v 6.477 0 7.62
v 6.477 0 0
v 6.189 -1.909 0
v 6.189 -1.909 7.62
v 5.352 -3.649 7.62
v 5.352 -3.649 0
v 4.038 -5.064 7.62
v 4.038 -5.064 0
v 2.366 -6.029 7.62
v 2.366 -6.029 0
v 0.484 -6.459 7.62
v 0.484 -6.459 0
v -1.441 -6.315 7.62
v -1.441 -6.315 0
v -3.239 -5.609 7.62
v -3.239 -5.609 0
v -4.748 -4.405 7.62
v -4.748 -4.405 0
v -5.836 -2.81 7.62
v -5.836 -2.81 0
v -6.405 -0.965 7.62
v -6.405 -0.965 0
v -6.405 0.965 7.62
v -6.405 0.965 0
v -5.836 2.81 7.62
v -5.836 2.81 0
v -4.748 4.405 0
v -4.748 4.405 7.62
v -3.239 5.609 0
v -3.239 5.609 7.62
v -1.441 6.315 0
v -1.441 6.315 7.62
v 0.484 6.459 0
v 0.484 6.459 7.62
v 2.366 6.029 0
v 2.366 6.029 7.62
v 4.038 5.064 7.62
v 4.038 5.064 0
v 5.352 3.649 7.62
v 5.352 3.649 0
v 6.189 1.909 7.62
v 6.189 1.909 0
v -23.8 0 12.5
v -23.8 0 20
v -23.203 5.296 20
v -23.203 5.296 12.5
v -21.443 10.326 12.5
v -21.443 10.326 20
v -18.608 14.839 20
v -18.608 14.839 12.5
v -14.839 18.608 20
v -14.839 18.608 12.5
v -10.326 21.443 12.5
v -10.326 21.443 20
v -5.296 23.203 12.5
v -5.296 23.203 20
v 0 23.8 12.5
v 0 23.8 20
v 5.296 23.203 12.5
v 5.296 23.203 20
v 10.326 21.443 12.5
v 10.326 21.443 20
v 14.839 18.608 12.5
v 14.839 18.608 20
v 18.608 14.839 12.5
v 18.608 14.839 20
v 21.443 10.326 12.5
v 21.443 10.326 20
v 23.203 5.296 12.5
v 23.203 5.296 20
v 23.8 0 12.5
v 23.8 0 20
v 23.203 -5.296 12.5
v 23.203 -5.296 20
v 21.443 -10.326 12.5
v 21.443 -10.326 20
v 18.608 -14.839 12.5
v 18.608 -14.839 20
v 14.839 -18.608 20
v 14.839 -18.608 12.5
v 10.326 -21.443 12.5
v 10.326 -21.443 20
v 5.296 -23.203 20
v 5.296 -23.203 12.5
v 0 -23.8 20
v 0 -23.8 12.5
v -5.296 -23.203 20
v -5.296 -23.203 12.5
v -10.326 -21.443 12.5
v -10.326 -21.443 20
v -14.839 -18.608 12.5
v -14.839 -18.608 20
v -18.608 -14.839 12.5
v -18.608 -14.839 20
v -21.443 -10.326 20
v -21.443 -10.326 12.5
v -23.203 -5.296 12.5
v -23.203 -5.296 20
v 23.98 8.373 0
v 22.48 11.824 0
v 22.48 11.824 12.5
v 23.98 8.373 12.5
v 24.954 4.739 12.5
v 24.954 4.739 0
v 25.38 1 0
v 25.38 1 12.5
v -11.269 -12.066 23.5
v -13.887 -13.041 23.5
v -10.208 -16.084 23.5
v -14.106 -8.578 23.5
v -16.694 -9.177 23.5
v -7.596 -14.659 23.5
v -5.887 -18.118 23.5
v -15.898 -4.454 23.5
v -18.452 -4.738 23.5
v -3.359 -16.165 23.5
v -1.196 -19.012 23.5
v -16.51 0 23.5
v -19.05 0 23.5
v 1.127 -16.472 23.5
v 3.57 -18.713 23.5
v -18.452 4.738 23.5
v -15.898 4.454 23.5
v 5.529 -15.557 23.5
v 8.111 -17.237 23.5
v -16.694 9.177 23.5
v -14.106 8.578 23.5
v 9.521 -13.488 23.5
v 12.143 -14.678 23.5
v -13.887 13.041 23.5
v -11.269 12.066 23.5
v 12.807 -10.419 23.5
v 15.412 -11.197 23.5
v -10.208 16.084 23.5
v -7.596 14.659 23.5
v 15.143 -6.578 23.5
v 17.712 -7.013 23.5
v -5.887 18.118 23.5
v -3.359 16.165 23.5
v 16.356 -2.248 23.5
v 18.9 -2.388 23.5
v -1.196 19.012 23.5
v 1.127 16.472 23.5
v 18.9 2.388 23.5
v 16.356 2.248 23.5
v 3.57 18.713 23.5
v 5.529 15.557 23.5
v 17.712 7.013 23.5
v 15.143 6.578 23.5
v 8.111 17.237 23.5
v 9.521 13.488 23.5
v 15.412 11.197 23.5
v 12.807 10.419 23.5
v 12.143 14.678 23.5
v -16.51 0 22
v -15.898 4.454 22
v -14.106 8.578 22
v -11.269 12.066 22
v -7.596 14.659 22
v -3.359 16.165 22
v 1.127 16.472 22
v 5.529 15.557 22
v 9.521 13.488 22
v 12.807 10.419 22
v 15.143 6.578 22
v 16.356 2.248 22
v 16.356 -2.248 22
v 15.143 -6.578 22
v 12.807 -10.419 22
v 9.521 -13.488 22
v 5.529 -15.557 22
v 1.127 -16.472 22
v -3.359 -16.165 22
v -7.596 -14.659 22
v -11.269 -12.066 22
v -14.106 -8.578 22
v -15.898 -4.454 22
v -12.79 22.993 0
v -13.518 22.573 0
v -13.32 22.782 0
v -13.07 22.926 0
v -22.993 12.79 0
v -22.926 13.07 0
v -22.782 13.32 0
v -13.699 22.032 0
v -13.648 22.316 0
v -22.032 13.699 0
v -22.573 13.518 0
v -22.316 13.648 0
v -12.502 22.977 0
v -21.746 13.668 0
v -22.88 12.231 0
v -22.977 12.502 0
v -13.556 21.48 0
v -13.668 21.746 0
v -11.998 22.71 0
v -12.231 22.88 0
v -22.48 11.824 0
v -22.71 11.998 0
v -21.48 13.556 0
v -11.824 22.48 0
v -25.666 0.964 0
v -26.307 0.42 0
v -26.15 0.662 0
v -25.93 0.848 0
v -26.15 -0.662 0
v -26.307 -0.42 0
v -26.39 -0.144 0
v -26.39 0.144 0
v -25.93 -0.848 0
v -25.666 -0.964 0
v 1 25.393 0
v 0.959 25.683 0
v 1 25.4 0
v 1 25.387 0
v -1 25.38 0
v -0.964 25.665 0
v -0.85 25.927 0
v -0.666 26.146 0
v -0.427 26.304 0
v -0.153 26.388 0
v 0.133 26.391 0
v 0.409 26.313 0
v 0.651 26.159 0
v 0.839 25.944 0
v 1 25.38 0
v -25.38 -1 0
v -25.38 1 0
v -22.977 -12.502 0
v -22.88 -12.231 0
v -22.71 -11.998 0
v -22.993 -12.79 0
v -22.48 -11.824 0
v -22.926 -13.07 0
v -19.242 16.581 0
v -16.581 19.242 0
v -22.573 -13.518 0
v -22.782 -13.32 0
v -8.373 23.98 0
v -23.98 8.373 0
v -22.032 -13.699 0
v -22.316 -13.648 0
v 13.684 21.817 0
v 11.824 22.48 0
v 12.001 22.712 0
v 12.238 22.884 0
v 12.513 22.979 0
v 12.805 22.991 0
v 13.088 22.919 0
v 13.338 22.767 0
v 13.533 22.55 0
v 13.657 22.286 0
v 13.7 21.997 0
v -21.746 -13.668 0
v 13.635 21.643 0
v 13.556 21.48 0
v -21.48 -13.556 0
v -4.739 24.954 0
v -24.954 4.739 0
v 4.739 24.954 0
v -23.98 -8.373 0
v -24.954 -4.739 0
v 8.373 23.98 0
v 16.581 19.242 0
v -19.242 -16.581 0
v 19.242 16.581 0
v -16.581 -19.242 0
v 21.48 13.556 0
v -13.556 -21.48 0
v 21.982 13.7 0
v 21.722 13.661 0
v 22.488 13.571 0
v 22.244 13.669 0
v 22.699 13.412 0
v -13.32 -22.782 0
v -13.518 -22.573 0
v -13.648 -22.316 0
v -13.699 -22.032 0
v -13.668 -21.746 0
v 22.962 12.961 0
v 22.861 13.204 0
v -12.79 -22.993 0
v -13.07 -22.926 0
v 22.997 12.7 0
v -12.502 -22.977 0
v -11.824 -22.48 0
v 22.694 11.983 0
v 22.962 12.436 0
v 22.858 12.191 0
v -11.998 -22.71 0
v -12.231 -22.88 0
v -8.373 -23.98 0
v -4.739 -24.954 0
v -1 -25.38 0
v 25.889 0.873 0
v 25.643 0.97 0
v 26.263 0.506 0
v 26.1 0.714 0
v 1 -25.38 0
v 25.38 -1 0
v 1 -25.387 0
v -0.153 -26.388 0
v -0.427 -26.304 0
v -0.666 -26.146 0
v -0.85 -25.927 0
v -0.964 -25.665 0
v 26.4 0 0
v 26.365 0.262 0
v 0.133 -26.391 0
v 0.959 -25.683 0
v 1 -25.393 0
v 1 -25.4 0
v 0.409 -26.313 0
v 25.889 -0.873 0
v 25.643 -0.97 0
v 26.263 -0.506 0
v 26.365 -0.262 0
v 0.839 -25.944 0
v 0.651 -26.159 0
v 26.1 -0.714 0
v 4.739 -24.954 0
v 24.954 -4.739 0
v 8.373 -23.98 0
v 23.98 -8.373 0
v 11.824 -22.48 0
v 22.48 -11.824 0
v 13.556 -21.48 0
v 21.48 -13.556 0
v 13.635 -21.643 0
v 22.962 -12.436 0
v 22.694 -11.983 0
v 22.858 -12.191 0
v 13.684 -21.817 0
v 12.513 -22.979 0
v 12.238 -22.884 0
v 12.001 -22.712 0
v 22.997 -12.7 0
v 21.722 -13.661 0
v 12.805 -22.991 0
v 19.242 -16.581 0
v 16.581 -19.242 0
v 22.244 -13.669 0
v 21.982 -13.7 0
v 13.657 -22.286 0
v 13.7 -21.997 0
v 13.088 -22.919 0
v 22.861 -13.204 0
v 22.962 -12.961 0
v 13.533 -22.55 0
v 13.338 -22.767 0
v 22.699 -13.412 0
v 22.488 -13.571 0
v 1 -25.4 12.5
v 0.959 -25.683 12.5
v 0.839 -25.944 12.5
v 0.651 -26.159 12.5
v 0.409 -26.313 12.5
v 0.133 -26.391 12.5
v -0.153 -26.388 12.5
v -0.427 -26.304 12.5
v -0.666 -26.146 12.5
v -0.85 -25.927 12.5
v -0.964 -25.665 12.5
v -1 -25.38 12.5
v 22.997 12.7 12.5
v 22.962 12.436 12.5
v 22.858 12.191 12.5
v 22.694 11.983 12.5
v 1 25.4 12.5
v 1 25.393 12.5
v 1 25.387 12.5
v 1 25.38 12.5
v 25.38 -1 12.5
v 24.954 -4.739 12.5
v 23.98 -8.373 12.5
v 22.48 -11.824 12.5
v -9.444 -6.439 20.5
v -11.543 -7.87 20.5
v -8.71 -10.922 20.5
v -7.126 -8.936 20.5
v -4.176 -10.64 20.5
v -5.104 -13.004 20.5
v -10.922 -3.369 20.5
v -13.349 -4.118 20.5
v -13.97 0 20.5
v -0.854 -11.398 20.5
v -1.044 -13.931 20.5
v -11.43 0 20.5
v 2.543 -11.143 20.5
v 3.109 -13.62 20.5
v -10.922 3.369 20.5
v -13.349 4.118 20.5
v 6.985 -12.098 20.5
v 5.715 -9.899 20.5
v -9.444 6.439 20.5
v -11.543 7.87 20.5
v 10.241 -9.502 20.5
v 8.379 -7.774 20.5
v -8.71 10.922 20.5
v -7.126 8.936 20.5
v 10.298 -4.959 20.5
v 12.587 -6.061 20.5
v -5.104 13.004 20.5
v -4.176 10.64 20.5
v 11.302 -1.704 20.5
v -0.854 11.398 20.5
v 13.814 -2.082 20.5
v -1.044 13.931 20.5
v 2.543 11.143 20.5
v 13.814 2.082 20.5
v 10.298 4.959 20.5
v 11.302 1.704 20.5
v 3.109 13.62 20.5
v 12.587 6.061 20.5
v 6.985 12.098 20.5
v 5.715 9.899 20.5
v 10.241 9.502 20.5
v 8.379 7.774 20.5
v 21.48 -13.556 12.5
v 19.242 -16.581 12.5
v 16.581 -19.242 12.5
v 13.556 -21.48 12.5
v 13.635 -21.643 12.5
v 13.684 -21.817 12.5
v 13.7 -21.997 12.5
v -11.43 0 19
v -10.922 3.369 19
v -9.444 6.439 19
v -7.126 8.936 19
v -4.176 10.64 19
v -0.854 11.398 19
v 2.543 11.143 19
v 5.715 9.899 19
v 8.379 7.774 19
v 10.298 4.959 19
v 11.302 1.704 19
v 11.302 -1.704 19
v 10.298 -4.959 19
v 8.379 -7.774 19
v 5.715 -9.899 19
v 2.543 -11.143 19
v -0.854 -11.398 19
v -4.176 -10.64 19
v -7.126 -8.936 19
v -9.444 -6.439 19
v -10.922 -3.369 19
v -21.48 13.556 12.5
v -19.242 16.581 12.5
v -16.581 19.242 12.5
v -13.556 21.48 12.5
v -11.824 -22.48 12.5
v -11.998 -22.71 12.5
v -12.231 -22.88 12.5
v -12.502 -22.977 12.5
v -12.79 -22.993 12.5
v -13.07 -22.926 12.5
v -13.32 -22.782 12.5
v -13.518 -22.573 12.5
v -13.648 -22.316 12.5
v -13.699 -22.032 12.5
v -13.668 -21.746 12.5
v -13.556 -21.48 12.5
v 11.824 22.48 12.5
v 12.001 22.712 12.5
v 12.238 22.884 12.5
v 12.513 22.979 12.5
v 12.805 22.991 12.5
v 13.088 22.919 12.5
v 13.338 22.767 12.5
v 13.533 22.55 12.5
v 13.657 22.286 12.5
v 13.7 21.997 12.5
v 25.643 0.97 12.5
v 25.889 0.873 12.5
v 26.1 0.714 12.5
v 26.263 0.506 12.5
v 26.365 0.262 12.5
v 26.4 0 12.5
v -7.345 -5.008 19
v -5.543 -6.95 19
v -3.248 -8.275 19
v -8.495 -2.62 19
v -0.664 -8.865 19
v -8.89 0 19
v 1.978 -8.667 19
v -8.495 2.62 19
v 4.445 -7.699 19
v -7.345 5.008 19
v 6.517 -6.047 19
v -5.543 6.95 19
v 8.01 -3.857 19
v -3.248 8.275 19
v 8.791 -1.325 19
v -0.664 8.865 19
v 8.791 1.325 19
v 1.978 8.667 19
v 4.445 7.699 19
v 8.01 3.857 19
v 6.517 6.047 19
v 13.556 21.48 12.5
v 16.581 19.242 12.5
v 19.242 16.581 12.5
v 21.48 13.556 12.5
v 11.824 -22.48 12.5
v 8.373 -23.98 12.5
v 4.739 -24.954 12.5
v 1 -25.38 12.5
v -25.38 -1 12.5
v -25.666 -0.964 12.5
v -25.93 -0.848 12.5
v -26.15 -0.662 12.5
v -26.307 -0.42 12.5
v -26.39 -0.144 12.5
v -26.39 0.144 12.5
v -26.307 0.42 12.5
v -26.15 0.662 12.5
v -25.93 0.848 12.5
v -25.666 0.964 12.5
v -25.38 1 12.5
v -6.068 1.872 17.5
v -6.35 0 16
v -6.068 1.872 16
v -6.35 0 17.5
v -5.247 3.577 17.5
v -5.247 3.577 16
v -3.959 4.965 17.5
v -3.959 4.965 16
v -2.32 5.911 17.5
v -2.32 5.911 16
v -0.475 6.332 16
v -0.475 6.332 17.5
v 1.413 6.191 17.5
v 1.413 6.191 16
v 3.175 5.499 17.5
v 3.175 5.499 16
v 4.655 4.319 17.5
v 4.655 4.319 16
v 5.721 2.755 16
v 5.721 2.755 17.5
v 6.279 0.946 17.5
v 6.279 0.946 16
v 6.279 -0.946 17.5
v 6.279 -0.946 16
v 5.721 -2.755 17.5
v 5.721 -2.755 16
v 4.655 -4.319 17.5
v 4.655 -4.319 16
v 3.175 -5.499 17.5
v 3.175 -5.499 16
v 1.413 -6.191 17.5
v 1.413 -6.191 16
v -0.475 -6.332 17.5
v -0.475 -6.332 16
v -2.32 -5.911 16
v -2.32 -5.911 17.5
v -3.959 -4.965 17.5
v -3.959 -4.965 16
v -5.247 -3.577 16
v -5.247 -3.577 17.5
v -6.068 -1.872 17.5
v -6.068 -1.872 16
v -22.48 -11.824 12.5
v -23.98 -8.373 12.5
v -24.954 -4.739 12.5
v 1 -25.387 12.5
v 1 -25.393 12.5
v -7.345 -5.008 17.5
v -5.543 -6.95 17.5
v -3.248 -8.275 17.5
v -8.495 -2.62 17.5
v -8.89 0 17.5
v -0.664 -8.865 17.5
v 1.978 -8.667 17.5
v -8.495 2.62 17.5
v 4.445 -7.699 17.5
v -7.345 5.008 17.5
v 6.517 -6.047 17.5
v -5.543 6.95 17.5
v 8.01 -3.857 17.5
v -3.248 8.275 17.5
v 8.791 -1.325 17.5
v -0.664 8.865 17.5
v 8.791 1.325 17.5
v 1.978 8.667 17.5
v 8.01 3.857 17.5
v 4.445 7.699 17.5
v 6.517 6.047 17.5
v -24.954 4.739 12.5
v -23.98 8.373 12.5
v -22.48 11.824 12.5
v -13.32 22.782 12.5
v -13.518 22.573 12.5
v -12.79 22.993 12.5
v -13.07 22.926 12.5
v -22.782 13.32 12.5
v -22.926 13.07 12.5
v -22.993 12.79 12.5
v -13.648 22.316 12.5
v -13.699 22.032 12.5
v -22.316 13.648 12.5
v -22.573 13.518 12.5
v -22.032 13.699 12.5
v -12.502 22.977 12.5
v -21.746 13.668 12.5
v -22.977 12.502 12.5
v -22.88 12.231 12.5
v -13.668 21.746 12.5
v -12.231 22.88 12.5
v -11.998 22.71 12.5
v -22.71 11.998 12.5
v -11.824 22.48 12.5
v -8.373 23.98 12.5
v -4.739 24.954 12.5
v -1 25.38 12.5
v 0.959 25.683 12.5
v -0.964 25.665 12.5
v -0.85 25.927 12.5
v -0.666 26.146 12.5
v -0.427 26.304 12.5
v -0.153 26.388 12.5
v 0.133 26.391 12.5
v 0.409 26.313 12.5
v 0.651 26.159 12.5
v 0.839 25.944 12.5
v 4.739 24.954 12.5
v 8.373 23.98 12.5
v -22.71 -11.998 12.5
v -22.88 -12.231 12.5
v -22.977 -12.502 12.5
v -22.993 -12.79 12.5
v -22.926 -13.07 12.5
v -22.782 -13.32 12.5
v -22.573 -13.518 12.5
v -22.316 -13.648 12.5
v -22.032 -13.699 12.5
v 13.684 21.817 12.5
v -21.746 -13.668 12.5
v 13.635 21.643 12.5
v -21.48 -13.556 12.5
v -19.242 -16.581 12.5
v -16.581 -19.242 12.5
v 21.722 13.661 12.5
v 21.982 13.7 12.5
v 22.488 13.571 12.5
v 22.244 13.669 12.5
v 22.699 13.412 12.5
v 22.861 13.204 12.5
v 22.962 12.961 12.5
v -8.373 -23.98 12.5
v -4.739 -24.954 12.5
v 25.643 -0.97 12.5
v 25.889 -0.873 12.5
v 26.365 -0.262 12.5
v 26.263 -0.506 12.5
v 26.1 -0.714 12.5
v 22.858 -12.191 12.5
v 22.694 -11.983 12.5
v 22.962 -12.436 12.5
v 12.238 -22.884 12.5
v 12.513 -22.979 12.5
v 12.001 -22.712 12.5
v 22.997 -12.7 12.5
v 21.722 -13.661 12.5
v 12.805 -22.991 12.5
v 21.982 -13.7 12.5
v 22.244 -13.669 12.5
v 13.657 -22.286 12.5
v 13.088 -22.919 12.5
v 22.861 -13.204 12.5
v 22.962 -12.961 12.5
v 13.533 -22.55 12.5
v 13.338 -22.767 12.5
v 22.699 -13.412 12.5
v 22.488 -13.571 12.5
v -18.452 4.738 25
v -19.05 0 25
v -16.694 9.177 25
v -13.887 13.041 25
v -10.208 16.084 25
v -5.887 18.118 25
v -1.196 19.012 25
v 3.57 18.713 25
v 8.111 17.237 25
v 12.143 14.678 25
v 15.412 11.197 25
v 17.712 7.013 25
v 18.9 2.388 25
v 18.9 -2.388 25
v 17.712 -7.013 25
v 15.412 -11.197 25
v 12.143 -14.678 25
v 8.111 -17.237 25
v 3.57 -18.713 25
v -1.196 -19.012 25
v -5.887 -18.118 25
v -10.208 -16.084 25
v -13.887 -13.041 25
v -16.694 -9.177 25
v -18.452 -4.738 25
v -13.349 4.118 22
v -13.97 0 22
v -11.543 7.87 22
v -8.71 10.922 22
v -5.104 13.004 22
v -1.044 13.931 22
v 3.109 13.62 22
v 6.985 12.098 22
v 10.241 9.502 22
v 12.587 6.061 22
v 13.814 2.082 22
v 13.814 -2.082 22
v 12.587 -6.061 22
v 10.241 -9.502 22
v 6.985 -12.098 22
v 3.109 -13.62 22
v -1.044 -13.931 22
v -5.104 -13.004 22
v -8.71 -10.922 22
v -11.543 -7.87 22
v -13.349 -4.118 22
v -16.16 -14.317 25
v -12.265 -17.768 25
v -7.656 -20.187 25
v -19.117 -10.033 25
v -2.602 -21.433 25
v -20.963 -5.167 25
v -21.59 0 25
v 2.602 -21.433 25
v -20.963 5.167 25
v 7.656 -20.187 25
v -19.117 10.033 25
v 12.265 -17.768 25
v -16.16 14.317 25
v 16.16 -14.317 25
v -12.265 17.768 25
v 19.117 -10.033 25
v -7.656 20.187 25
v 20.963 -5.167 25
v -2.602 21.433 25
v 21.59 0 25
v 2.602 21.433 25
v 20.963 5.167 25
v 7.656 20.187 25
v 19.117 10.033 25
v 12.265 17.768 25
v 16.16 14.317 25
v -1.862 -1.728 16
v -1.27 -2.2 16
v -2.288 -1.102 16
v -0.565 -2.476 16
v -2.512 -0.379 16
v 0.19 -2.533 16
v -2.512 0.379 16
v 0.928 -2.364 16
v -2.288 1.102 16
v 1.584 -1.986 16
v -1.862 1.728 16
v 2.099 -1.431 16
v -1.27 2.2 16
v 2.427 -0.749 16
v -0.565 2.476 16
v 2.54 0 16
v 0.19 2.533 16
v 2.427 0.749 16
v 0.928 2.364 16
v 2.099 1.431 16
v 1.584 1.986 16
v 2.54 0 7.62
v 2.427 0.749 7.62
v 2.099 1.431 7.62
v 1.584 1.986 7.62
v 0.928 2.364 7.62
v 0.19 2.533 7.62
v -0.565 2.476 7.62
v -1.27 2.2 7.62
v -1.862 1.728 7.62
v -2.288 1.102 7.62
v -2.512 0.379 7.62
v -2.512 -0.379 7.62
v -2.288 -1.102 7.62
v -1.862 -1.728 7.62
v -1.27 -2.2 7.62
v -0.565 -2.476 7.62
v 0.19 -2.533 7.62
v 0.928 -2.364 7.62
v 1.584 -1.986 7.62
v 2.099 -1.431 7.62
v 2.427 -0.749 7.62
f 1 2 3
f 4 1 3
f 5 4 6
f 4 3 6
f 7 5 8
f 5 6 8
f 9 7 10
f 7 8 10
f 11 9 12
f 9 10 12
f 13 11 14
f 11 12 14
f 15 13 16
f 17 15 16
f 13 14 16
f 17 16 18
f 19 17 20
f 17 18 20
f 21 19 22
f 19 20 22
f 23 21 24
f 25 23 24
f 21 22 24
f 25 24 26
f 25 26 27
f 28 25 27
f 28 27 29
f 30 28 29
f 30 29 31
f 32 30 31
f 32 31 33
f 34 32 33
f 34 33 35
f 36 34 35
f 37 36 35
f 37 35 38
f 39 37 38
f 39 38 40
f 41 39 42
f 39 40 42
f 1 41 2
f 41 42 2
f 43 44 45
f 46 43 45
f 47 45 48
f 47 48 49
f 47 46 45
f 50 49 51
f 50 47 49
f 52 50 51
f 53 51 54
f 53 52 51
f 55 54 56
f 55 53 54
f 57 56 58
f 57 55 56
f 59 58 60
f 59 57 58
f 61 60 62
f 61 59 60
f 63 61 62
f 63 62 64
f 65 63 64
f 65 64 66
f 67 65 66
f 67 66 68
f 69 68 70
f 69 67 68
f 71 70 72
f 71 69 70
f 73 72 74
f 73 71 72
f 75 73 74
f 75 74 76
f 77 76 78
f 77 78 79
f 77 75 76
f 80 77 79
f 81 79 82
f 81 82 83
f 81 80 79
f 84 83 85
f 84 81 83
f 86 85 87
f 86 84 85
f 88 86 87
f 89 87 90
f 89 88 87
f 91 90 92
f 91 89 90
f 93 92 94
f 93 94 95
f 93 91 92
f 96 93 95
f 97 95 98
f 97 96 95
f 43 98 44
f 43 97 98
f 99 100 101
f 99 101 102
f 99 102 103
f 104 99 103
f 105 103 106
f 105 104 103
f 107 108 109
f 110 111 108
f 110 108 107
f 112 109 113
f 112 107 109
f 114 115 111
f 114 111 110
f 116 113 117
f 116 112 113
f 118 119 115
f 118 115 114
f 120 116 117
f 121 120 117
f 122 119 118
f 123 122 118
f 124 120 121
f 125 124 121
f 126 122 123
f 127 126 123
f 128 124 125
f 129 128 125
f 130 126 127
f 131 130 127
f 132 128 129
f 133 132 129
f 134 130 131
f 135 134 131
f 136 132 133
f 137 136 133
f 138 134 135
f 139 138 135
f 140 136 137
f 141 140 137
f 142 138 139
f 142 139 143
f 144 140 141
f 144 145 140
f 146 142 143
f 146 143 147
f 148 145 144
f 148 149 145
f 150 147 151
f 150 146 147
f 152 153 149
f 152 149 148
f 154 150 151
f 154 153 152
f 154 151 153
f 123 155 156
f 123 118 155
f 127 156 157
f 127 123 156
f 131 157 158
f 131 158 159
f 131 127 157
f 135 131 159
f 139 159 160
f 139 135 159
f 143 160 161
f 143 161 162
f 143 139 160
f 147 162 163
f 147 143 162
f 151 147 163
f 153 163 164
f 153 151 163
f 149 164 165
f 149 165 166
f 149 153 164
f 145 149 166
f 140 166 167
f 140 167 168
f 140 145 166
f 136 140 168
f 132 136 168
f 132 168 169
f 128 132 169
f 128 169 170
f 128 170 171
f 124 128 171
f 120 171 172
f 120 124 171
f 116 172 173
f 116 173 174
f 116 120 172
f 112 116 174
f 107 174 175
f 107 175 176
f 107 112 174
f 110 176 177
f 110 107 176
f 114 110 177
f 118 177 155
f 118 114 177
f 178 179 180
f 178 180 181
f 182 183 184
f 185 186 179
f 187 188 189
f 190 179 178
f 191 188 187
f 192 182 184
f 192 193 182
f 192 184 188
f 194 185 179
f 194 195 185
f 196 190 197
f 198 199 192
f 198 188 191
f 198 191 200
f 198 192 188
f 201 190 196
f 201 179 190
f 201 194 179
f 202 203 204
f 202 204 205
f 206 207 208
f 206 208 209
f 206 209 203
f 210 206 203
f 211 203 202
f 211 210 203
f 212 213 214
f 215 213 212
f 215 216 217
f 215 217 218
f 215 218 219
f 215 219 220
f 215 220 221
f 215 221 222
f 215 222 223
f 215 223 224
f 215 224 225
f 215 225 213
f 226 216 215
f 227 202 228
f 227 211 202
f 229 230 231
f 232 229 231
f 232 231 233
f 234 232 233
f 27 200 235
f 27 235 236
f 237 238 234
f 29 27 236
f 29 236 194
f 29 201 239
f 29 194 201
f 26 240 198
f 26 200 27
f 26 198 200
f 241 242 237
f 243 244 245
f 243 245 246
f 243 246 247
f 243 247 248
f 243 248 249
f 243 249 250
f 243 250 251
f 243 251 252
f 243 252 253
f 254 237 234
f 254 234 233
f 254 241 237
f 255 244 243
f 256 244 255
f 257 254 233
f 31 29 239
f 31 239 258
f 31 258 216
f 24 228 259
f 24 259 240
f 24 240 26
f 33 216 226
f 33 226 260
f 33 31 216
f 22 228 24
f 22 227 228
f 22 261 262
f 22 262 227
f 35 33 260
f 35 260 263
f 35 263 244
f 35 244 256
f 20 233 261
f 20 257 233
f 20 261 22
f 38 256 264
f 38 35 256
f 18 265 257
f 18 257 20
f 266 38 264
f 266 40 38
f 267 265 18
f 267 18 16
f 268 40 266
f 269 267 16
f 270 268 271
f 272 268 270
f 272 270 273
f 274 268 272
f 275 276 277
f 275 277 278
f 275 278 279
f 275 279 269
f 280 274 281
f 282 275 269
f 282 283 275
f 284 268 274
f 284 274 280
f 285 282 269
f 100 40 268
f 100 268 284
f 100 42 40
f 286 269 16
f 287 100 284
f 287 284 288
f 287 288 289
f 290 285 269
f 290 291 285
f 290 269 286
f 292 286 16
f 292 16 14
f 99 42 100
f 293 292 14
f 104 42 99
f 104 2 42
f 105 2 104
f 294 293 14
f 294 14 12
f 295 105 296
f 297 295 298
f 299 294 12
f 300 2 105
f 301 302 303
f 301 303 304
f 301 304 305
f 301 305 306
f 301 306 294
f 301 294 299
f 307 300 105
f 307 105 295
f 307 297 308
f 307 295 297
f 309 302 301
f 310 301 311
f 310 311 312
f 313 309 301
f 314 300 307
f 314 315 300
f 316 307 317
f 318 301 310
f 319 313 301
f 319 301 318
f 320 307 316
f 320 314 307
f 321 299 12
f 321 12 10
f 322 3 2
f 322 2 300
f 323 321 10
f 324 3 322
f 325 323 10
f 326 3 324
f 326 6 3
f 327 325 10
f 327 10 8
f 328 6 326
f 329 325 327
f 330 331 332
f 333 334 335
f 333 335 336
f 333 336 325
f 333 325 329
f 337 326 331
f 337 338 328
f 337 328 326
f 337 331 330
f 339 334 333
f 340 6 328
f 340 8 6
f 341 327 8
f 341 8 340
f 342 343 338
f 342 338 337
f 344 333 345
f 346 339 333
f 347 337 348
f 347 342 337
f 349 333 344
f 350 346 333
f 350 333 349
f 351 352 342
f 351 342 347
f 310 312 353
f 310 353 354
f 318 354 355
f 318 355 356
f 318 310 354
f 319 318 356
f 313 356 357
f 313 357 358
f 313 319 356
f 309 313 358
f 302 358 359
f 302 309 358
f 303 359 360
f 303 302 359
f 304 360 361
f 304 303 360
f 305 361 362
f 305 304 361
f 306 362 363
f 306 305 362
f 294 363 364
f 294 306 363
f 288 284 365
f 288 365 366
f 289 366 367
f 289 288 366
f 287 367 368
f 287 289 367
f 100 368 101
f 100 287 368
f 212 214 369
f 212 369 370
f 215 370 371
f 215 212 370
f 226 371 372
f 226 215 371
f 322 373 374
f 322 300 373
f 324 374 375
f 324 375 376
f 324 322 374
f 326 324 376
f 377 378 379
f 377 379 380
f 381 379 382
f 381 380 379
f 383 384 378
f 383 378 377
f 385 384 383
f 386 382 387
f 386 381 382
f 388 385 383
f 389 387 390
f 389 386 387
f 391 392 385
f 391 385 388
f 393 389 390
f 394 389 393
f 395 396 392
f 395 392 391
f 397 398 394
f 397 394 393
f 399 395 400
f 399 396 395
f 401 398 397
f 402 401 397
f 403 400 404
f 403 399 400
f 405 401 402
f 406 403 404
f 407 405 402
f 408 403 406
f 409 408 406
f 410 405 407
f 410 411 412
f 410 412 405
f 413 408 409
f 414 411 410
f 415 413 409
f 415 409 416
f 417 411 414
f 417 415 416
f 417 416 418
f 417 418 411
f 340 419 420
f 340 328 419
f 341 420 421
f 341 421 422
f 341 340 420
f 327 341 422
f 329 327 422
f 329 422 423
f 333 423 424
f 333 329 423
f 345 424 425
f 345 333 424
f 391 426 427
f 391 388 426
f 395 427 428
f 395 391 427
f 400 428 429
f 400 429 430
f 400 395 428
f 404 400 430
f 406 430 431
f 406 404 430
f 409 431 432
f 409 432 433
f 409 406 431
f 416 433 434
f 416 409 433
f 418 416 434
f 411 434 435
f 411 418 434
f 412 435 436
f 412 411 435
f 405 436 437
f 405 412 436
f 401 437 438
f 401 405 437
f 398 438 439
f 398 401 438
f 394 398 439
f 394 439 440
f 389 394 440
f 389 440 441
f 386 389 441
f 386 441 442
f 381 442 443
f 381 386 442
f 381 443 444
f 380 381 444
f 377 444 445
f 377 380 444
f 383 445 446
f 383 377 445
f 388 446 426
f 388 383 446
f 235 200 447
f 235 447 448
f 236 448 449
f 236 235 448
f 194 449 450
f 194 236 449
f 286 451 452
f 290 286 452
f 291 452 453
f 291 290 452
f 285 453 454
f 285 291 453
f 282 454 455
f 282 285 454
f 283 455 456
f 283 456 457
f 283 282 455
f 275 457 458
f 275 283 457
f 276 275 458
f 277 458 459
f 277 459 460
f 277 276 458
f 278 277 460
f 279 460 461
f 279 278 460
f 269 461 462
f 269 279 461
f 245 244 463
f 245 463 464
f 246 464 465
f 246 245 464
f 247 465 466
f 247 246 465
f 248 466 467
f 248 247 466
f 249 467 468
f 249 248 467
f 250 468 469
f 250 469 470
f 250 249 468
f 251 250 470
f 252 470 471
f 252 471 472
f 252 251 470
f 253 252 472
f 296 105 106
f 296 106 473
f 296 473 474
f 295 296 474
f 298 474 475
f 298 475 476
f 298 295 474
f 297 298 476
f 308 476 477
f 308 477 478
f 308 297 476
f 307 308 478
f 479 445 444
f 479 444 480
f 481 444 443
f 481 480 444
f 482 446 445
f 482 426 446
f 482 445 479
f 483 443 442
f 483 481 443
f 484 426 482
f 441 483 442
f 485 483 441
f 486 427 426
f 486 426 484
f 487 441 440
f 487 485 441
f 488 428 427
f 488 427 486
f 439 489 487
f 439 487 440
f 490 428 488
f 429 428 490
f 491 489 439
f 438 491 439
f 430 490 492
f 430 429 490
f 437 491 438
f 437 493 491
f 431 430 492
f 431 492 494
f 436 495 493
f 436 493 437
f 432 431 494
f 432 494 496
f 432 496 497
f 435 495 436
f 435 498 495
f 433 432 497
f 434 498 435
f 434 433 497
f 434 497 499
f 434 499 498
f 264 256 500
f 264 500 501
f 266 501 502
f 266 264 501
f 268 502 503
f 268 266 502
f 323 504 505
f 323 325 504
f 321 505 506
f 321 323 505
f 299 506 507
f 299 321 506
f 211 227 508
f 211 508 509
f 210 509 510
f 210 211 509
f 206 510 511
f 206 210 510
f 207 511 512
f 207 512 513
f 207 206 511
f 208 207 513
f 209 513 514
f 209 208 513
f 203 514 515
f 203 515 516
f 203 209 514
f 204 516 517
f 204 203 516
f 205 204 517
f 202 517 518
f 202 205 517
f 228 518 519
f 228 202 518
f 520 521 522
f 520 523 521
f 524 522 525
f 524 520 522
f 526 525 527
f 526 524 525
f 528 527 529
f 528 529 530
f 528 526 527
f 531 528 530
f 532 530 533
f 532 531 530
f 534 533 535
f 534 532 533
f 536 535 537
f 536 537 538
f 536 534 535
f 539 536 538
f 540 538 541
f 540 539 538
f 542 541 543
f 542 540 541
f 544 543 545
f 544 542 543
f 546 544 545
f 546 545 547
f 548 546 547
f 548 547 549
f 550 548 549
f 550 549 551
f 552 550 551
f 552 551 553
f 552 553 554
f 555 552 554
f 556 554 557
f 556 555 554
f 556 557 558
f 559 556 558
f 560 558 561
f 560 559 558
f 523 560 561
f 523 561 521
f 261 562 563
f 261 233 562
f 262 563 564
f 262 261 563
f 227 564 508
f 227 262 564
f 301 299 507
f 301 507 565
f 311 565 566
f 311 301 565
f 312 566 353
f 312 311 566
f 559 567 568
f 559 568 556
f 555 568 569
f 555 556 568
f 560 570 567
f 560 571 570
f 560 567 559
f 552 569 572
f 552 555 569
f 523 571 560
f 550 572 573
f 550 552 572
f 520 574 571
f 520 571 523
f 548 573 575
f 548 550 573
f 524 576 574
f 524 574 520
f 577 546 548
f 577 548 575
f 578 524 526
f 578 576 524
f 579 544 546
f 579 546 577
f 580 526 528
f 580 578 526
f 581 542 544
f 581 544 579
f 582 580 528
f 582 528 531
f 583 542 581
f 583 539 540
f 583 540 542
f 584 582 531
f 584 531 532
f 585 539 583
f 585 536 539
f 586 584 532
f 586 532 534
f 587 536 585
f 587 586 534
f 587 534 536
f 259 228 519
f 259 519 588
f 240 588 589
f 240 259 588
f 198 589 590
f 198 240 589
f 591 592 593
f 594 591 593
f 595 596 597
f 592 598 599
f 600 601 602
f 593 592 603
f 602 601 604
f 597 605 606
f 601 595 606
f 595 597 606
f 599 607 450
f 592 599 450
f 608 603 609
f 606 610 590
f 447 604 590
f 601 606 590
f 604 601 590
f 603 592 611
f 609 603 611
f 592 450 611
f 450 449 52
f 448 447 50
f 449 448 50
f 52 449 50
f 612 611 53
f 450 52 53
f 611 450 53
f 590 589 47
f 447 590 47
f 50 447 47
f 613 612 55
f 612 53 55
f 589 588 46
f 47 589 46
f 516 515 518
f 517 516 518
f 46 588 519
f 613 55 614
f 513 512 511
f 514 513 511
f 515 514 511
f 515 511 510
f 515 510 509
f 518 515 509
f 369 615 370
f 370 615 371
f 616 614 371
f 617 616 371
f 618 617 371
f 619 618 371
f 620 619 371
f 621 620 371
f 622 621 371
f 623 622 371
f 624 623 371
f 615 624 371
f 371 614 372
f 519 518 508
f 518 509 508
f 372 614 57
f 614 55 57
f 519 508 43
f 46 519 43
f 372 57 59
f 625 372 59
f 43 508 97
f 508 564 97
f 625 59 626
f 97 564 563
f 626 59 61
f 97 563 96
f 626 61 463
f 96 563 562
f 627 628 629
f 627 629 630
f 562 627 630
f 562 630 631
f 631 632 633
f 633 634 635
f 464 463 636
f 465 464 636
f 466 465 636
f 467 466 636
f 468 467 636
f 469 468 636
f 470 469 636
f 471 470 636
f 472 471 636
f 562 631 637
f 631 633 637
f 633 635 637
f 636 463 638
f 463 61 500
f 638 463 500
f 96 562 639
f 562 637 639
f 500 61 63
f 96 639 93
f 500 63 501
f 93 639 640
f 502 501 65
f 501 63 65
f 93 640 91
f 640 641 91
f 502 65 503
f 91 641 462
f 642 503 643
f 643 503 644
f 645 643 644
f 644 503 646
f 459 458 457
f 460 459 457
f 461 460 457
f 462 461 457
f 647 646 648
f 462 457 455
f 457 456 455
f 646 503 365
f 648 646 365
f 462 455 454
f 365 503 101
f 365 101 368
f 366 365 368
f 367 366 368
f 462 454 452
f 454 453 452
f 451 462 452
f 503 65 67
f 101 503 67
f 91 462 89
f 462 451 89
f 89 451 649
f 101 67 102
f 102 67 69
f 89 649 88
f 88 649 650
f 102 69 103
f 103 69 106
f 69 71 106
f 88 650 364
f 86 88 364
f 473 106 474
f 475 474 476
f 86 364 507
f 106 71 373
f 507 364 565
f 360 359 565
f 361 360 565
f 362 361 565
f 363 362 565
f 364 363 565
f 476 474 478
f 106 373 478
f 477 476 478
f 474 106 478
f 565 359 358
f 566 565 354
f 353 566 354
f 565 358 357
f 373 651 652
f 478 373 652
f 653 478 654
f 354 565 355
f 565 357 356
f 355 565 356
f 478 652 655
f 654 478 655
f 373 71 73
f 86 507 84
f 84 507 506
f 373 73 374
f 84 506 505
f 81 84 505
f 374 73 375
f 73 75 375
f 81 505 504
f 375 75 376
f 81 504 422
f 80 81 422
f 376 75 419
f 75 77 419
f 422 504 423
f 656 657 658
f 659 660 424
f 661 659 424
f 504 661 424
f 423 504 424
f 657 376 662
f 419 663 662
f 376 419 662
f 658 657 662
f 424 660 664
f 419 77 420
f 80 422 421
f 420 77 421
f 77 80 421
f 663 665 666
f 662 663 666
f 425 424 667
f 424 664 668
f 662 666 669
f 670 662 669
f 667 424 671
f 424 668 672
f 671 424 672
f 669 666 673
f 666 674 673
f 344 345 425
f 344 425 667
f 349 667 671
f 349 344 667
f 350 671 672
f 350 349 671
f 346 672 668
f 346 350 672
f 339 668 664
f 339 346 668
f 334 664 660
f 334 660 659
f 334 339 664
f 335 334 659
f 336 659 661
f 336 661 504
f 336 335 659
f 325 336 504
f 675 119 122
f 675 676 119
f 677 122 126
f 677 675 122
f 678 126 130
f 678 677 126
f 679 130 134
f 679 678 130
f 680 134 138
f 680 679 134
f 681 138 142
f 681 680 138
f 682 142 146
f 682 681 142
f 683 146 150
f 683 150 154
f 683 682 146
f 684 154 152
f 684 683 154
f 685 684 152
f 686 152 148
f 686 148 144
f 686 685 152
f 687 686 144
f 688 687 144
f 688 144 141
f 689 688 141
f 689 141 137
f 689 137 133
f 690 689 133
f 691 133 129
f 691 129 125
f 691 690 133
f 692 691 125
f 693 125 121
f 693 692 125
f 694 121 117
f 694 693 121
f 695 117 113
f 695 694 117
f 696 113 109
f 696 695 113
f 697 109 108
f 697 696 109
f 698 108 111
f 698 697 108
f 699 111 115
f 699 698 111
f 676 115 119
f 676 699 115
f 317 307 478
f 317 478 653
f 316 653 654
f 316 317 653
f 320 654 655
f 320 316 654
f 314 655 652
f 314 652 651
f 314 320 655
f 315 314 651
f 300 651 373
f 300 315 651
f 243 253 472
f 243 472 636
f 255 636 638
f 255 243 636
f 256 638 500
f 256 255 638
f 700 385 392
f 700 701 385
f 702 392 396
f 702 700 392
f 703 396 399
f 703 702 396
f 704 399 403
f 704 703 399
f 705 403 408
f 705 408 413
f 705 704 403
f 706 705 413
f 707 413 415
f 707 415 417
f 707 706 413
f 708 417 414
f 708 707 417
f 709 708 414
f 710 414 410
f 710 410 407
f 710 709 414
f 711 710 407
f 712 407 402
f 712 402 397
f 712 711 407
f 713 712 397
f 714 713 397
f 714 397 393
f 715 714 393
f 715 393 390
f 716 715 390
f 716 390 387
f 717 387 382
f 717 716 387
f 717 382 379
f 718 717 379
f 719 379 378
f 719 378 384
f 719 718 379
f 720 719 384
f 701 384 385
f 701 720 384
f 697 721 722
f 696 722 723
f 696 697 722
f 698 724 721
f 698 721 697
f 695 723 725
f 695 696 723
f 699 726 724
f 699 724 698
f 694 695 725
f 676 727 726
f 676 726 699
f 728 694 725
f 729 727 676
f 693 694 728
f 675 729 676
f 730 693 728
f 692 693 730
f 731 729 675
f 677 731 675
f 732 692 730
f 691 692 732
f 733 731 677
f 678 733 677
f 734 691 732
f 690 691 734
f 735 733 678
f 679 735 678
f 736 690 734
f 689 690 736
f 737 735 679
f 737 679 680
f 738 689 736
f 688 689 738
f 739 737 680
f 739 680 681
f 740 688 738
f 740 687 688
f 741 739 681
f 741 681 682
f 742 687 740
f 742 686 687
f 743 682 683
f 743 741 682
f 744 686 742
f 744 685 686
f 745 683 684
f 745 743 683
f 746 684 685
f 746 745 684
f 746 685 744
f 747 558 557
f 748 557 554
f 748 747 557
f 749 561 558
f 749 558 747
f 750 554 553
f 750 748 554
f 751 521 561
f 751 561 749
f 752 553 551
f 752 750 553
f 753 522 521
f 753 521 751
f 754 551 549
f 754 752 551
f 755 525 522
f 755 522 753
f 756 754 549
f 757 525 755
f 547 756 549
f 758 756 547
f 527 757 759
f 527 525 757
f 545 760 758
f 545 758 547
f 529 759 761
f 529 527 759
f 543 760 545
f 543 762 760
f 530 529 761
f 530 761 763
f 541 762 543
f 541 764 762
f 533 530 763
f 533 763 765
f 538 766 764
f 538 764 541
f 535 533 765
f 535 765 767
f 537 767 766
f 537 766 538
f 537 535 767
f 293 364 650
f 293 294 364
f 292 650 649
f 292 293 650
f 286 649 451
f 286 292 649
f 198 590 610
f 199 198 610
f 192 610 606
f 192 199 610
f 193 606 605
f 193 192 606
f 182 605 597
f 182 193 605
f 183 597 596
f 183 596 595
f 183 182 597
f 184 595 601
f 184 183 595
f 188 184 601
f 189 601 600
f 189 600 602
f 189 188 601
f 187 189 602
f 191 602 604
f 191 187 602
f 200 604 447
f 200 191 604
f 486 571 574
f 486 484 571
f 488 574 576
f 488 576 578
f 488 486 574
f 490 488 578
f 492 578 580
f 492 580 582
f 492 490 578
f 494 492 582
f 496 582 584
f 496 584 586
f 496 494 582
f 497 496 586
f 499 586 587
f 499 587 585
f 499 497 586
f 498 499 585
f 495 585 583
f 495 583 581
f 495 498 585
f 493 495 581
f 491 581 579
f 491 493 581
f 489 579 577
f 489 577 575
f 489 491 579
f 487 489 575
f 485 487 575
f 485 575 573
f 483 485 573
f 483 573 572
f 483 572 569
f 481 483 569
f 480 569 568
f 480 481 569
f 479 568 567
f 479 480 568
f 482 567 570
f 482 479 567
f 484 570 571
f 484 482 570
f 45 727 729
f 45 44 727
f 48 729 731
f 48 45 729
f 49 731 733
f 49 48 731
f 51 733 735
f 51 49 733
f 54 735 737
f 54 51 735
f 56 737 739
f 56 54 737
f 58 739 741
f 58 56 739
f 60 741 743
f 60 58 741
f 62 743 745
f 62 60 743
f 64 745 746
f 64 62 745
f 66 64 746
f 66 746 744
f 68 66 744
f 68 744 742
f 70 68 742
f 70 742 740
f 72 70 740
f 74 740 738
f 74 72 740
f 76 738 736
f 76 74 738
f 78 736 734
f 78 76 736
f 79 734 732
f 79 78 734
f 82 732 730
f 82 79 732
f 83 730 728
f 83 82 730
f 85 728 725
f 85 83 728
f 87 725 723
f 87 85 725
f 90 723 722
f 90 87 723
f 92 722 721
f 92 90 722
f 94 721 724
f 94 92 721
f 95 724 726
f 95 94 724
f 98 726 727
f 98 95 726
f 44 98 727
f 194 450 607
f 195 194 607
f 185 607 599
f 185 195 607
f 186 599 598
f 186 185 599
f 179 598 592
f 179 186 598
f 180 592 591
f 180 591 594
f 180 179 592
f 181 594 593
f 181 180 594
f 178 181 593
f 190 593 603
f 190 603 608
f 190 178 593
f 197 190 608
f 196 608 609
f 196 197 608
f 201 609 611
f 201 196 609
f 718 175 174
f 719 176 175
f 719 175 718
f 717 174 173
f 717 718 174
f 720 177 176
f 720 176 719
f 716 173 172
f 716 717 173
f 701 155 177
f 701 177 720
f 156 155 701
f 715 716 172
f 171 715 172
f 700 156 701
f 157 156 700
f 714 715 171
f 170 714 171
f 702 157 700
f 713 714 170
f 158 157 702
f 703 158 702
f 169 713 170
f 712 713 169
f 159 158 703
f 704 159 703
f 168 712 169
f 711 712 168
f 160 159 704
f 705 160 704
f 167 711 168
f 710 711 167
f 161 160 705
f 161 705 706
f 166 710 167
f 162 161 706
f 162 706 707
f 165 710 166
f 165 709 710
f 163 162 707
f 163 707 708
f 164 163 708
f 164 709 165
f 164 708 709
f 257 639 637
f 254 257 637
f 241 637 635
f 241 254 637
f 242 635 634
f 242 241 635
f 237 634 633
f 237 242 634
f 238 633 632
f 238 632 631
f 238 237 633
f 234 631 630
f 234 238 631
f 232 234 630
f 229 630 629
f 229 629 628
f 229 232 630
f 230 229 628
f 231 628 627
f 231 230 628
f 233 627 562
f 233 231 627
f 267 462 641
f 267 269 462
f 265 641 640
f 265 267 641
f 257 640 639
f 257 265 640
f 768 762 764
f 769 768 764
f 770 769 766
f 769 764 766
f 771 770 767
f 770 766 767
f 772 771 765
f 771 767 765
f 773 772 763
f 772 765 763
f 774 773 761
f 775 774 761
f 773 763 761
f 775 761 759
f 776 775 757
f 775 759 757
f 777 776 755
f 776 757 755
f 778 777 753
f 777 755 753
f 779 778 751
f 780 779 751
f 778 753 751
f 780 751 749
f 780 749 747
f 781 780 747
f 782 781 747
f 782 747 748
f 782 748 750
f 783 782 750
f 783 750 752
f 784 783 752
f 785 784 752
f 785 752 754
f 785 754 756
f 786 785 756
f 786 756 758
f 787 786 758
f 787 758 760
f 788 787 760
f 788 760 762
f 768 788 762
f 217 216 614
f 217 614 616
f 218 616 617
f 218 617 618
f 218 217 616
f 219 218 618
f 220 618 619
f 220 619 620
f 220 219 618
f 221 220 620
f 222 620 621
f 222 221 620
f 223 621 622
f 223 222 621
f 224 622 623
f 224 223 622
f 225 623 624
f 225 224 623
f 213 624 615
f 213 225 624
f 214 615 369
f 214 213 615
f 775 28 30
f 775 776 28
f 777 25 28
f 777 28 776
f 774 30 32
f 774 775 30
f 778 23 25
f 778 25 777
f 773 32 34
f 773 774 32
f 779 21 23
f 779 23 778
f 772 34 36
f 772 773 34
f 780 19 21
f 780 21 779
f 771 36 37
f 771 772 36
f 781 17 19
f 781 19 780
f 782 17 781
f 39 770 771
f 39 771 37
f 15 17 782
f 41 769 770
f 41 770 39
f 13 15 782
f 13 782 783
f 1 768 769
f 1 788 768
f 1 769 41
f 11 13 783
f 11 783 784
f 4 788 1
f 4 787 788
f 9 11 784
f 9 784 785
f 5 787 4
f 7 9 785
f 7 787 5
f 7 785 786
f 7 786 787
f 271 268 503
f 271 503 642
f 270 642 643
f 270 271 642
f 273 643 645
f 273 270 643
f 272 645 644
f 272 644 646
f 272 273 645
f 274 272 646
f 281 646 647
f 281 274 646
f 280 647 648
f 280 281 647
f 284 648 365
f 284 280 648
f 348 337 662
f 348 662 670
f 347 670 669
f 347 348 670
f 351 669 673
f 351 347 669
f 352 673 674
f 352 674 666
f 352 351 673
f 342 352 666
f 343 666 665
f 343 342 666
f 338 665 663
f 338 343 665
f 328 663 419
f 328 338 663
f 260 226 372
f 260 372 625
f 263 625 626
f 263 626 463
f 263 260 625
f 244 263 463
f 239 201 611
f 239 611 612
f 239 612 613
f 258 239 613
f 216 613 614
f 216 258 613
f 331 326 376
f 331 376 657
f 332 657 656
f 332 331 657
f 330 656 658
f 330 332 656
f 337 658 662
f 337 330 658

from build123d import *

# Parameters (mm, degrees)
F3_DEPTH = 12.5
F2_R     = 6.477
F4_DEPTH = 7.62
F5_R     = 2.54
F6_DEPTH = 25.4


with BuildPart() as f1:
    # F0 (on Front) → F1 (revolve)
    with BuildSketch(Plane.XZ):
        Polygon((-25.4, 0), (0, 0), (0, 16), (-6.35, 16), (-6.35, 17.5), (-8.89, 17.5), (-8.89, 19), (-11.43, 19), (-11.43, 20.5), (-13.97, 20.5), (-13.97, 22), (-16.51, 22), (-16.51, 23.5), (-19.05, 23.5), (-19.05, 25), (-21.59, 25), (-23.8, 20), (-23.8, 12.5), (-25.4, 12.5), align=None)
    revolve(axis=Axis((0, 0, 8), (0, 0, -1)))

    # F2 (on face) → F3 (join)
    with BuildSketch(Plane(origin=(0, 0, 0), x_dir=(1, 0, 0), z_dir=(0, 0, -1))):
        with BuildLine():
            ThreePointArc((-25.3803149606, -0.9998062308), (-25.4, 0), (-25.3803149606, 0.9998062308))
            ThreePointArc((-25.3803149606, 0.9998062308), (-26.4, 0), (-25.3803149606, -0.9998062308))
        make_face()
        with BuildLine():
            ThreePointArc((-21.4800943965, 13.5560150751), (-21.9970452561, 12.7), (-22.4799006274, 11.8242998855))
            ThreePointArc((-22.4799006274, 11.8242998855), (-21.4885451928, 11.8389380477), (-20.9970452561, 12.7))
            ThreePointArc((-20.9970452561, 12.7), (-21.1261403074, 13.1914514932), (-21.4800943965, 13.5560150751))
        make_face()
        with BuildLine():
            ThreePointArc((-21.4800943965, 13.5560150751), (-22.8630706599, 13.2), (-22.4799006274, 11.8242998855))
            ThreePointArc((-22.4799006274, 11.8242998855), (-21.9970452561, 12.7), (-21.4800943965, 13.5560150751))
        make_face()
        with BuildLine():
            ThreePointArc((-21.4800943965, -13.5560150751), (-21.9970452561, -12.7), (-22.4799006274, -11.8242998855))
            ThreePointArc((-22.4799006274, -11.8242998855), (-22.8630706599, -13.2), (-21.4800943965, -13.5560150751))
        make_face()
        with BuildLine():
            ThreePointArc((-11.8242998855, 22.4799006274), (-12.7, 21.9970452561), (-13.5560150751, 21.4800943965))
            ThreePointArc((-13.5560150751, 21.4800943965), (-12.4316858884, 21.0337137776), (-11.7, 21.9970452561))
            ThreePointArc((-11.7, 21.9970452561), (-11.7315734115, 22.2463441586), (-11.8242998855, 22.4799006274))
        make_face()
        with BuildLine():
            ThreePointArc((-11.8242998855, 22.4799006274), (-13.2, 22.8630706599), (-13.5560150751, 21.4800943965))
            ThreePointArc((-13.5560150751, 21.4800943965), (-12.7, 21.9970452561), (-11.8242998855, 22.4799006274))
        make_face()
        with BuildLine():
            ThreePointArc((-11.8242998855, -22.4799006274), (-12.7, -21.9970452561), (-13.5560150751, -21.4800943965))
            ThreePointArc((-13.5560150751, -21.4800943965), (-13.2, -22.8630706599), (-11.8242998855, -22.4799006274))
        make_face()
        with BuildLine():
            ThreePointArc((0.9998062308, 25.3803149606), (0, 25.4), (-0.9998062308, 25.3803149606))
            ThreePointArc((-0.9998062308, 25.3803149606), (0, 24.4), (0.9998062308, 25.3803149606))
        make_face()
        with BuildLine():
            ThreePointArc((1, 25.4), (-0.0098429965, 26.3999515565), (-0.9998062308, 25.3803149606))
            ThreePointArc((-0.9998062308, 25.3803149606), (0, 25.4), (0.9998062308, 25.3803149606))
            ThreePointArc((0.9998062308, 25.3803149606), (0.9999515565, 25.3901570035), (1, 25.4))
        make_face()
        with BuildLine():
            ThreePointArc((0.9998062308, -25.3803149606), (0, -25.4), (-0.9998062308, -25.3803149606))
            ThreePointArc((-0.9998062308, -25.3803149606), (-0.0098429965, -26.3999515565), (1, -25.4))
            ThreePointArc((1, -25.4), (0.9999515565, -25.3901570035), (0.9998062308, -25.3803149606))
        make_face()
        with BuildLine():
            ThreePointArc((13.5560150751, 21.4800943965), (12.7, 21.9970452561), (11.8242998855, 22.4799006274))
            ThreePointArc((11.8242998855, 22.4799006274), (12.2, 21.1310198523), (13.5560150751, 21.4800943965))
        make_face()
        with BuildLine():
            ThreePointArc((13.7, 21.9970452561), (12.9492989025, 22.9654718446), (11.8242998855, 22.4799006274))
            ThreePointArc((11.8242998855, 22.4799006274), (12.7, 21.9970452561), (13.5560150751, 21.4800943965))
            ThreePointArc((13.5560150751, 21.4800943965), (13.6633314785, 21.7287311446), (13.7, 21.9970452561))
        make_face()
        with BuildLine():
            ThreePointArc((13.5560150751, -21.4800943965), (12.7, -21.9970452561), (11.8242998855, -22.4799006274))
            ThreePointArc((11.8242998855, -22.4799006274), (12.9492989025, -22.9654718446), (13.7, -21.9970452561))
            ThreePointArc((13.7, -21.9970452561), (13.6633314785, -21.7287311446), (13.5560150751, -21.4800943965))
        make_face()
        with BuildLine():
            ThreePointArc((22.4799006274, 11.8242998855), (21.9970452561, 12.7), (21.4800943965, 13.5560150751))
            ThreePointArc((21.4800943965, 13.5560150751), (21.1310198523, 12.2), (22.4799006274, 11.8242998855))
        make_face()
        with BuildLine():
            ThreePointArc((22.9970452561, 12.7), (22.4884967494, 13.5709049488), (21.4800943965, 13.5560150751))
            ThreePointArc((21.4800943965, 13.5560150751), (21.9970452561, 12.7), (22.4799006274, 11.8242998855))
            ThreePointArc((22.4799006274, 11.8242998855), (22.8581072084, 12.1914999367), (22.9970452561, 12.7))
        make_face()
        with BuildLine():
            ThreePointArc((22.4799006274, -11.8242998855), (21.9970452561, -12.7), (21.4800943965, -13.5560150751))
            ThreePointArc((21.4800943965, -13.5560150751), (22.4884967494, -13.5709049488), (22.9970452561, -12.7))
            ThreePointArc((22.9970452561, -12.7), (22.8581072084, -12.1914999367), (22.4799006274, -11.8242998855))
        make_face()
        with BuildLine():
            ThreePointArc((26.4, 0), (26.1001124769, 0.7140325761), (25.3803149606, 0.9998062308))
            ThreePointArc((25.3803149606, 0.9998062308), (25.3950782633, 0.5), (25.4, 0))
            ThreePointArc((25.4, 0), (25.3950782633, -0.5), (25.3803149606, -0.9998062308))
            ThreePointArc((25.3803149606, -0.9998062308), (26.1001124769, -0.7140325761), (26.4, 0))
        make_face()
    extrude(amount=-F3_DEPTH)

    # F2 (on face) → F4 (cut)
    with BuildSketch(Plane(origin=(0, 0, 0), x_dir=(1, 0, 0), z_dir=(0, 0, -1))):
        Circle(F2_R)
    extrude(amount=-F4_DEPTH, mode=Mode.SUBTRACT)

    # F5 (on face) → F6 (cut)
    with BuildSketch(Plane.XY.offset(16)):
        Circle(F5_R)
    extrude(amount=-F6_DEPTH, mode=Mode.SUBTRACT)


solid = f1.part
